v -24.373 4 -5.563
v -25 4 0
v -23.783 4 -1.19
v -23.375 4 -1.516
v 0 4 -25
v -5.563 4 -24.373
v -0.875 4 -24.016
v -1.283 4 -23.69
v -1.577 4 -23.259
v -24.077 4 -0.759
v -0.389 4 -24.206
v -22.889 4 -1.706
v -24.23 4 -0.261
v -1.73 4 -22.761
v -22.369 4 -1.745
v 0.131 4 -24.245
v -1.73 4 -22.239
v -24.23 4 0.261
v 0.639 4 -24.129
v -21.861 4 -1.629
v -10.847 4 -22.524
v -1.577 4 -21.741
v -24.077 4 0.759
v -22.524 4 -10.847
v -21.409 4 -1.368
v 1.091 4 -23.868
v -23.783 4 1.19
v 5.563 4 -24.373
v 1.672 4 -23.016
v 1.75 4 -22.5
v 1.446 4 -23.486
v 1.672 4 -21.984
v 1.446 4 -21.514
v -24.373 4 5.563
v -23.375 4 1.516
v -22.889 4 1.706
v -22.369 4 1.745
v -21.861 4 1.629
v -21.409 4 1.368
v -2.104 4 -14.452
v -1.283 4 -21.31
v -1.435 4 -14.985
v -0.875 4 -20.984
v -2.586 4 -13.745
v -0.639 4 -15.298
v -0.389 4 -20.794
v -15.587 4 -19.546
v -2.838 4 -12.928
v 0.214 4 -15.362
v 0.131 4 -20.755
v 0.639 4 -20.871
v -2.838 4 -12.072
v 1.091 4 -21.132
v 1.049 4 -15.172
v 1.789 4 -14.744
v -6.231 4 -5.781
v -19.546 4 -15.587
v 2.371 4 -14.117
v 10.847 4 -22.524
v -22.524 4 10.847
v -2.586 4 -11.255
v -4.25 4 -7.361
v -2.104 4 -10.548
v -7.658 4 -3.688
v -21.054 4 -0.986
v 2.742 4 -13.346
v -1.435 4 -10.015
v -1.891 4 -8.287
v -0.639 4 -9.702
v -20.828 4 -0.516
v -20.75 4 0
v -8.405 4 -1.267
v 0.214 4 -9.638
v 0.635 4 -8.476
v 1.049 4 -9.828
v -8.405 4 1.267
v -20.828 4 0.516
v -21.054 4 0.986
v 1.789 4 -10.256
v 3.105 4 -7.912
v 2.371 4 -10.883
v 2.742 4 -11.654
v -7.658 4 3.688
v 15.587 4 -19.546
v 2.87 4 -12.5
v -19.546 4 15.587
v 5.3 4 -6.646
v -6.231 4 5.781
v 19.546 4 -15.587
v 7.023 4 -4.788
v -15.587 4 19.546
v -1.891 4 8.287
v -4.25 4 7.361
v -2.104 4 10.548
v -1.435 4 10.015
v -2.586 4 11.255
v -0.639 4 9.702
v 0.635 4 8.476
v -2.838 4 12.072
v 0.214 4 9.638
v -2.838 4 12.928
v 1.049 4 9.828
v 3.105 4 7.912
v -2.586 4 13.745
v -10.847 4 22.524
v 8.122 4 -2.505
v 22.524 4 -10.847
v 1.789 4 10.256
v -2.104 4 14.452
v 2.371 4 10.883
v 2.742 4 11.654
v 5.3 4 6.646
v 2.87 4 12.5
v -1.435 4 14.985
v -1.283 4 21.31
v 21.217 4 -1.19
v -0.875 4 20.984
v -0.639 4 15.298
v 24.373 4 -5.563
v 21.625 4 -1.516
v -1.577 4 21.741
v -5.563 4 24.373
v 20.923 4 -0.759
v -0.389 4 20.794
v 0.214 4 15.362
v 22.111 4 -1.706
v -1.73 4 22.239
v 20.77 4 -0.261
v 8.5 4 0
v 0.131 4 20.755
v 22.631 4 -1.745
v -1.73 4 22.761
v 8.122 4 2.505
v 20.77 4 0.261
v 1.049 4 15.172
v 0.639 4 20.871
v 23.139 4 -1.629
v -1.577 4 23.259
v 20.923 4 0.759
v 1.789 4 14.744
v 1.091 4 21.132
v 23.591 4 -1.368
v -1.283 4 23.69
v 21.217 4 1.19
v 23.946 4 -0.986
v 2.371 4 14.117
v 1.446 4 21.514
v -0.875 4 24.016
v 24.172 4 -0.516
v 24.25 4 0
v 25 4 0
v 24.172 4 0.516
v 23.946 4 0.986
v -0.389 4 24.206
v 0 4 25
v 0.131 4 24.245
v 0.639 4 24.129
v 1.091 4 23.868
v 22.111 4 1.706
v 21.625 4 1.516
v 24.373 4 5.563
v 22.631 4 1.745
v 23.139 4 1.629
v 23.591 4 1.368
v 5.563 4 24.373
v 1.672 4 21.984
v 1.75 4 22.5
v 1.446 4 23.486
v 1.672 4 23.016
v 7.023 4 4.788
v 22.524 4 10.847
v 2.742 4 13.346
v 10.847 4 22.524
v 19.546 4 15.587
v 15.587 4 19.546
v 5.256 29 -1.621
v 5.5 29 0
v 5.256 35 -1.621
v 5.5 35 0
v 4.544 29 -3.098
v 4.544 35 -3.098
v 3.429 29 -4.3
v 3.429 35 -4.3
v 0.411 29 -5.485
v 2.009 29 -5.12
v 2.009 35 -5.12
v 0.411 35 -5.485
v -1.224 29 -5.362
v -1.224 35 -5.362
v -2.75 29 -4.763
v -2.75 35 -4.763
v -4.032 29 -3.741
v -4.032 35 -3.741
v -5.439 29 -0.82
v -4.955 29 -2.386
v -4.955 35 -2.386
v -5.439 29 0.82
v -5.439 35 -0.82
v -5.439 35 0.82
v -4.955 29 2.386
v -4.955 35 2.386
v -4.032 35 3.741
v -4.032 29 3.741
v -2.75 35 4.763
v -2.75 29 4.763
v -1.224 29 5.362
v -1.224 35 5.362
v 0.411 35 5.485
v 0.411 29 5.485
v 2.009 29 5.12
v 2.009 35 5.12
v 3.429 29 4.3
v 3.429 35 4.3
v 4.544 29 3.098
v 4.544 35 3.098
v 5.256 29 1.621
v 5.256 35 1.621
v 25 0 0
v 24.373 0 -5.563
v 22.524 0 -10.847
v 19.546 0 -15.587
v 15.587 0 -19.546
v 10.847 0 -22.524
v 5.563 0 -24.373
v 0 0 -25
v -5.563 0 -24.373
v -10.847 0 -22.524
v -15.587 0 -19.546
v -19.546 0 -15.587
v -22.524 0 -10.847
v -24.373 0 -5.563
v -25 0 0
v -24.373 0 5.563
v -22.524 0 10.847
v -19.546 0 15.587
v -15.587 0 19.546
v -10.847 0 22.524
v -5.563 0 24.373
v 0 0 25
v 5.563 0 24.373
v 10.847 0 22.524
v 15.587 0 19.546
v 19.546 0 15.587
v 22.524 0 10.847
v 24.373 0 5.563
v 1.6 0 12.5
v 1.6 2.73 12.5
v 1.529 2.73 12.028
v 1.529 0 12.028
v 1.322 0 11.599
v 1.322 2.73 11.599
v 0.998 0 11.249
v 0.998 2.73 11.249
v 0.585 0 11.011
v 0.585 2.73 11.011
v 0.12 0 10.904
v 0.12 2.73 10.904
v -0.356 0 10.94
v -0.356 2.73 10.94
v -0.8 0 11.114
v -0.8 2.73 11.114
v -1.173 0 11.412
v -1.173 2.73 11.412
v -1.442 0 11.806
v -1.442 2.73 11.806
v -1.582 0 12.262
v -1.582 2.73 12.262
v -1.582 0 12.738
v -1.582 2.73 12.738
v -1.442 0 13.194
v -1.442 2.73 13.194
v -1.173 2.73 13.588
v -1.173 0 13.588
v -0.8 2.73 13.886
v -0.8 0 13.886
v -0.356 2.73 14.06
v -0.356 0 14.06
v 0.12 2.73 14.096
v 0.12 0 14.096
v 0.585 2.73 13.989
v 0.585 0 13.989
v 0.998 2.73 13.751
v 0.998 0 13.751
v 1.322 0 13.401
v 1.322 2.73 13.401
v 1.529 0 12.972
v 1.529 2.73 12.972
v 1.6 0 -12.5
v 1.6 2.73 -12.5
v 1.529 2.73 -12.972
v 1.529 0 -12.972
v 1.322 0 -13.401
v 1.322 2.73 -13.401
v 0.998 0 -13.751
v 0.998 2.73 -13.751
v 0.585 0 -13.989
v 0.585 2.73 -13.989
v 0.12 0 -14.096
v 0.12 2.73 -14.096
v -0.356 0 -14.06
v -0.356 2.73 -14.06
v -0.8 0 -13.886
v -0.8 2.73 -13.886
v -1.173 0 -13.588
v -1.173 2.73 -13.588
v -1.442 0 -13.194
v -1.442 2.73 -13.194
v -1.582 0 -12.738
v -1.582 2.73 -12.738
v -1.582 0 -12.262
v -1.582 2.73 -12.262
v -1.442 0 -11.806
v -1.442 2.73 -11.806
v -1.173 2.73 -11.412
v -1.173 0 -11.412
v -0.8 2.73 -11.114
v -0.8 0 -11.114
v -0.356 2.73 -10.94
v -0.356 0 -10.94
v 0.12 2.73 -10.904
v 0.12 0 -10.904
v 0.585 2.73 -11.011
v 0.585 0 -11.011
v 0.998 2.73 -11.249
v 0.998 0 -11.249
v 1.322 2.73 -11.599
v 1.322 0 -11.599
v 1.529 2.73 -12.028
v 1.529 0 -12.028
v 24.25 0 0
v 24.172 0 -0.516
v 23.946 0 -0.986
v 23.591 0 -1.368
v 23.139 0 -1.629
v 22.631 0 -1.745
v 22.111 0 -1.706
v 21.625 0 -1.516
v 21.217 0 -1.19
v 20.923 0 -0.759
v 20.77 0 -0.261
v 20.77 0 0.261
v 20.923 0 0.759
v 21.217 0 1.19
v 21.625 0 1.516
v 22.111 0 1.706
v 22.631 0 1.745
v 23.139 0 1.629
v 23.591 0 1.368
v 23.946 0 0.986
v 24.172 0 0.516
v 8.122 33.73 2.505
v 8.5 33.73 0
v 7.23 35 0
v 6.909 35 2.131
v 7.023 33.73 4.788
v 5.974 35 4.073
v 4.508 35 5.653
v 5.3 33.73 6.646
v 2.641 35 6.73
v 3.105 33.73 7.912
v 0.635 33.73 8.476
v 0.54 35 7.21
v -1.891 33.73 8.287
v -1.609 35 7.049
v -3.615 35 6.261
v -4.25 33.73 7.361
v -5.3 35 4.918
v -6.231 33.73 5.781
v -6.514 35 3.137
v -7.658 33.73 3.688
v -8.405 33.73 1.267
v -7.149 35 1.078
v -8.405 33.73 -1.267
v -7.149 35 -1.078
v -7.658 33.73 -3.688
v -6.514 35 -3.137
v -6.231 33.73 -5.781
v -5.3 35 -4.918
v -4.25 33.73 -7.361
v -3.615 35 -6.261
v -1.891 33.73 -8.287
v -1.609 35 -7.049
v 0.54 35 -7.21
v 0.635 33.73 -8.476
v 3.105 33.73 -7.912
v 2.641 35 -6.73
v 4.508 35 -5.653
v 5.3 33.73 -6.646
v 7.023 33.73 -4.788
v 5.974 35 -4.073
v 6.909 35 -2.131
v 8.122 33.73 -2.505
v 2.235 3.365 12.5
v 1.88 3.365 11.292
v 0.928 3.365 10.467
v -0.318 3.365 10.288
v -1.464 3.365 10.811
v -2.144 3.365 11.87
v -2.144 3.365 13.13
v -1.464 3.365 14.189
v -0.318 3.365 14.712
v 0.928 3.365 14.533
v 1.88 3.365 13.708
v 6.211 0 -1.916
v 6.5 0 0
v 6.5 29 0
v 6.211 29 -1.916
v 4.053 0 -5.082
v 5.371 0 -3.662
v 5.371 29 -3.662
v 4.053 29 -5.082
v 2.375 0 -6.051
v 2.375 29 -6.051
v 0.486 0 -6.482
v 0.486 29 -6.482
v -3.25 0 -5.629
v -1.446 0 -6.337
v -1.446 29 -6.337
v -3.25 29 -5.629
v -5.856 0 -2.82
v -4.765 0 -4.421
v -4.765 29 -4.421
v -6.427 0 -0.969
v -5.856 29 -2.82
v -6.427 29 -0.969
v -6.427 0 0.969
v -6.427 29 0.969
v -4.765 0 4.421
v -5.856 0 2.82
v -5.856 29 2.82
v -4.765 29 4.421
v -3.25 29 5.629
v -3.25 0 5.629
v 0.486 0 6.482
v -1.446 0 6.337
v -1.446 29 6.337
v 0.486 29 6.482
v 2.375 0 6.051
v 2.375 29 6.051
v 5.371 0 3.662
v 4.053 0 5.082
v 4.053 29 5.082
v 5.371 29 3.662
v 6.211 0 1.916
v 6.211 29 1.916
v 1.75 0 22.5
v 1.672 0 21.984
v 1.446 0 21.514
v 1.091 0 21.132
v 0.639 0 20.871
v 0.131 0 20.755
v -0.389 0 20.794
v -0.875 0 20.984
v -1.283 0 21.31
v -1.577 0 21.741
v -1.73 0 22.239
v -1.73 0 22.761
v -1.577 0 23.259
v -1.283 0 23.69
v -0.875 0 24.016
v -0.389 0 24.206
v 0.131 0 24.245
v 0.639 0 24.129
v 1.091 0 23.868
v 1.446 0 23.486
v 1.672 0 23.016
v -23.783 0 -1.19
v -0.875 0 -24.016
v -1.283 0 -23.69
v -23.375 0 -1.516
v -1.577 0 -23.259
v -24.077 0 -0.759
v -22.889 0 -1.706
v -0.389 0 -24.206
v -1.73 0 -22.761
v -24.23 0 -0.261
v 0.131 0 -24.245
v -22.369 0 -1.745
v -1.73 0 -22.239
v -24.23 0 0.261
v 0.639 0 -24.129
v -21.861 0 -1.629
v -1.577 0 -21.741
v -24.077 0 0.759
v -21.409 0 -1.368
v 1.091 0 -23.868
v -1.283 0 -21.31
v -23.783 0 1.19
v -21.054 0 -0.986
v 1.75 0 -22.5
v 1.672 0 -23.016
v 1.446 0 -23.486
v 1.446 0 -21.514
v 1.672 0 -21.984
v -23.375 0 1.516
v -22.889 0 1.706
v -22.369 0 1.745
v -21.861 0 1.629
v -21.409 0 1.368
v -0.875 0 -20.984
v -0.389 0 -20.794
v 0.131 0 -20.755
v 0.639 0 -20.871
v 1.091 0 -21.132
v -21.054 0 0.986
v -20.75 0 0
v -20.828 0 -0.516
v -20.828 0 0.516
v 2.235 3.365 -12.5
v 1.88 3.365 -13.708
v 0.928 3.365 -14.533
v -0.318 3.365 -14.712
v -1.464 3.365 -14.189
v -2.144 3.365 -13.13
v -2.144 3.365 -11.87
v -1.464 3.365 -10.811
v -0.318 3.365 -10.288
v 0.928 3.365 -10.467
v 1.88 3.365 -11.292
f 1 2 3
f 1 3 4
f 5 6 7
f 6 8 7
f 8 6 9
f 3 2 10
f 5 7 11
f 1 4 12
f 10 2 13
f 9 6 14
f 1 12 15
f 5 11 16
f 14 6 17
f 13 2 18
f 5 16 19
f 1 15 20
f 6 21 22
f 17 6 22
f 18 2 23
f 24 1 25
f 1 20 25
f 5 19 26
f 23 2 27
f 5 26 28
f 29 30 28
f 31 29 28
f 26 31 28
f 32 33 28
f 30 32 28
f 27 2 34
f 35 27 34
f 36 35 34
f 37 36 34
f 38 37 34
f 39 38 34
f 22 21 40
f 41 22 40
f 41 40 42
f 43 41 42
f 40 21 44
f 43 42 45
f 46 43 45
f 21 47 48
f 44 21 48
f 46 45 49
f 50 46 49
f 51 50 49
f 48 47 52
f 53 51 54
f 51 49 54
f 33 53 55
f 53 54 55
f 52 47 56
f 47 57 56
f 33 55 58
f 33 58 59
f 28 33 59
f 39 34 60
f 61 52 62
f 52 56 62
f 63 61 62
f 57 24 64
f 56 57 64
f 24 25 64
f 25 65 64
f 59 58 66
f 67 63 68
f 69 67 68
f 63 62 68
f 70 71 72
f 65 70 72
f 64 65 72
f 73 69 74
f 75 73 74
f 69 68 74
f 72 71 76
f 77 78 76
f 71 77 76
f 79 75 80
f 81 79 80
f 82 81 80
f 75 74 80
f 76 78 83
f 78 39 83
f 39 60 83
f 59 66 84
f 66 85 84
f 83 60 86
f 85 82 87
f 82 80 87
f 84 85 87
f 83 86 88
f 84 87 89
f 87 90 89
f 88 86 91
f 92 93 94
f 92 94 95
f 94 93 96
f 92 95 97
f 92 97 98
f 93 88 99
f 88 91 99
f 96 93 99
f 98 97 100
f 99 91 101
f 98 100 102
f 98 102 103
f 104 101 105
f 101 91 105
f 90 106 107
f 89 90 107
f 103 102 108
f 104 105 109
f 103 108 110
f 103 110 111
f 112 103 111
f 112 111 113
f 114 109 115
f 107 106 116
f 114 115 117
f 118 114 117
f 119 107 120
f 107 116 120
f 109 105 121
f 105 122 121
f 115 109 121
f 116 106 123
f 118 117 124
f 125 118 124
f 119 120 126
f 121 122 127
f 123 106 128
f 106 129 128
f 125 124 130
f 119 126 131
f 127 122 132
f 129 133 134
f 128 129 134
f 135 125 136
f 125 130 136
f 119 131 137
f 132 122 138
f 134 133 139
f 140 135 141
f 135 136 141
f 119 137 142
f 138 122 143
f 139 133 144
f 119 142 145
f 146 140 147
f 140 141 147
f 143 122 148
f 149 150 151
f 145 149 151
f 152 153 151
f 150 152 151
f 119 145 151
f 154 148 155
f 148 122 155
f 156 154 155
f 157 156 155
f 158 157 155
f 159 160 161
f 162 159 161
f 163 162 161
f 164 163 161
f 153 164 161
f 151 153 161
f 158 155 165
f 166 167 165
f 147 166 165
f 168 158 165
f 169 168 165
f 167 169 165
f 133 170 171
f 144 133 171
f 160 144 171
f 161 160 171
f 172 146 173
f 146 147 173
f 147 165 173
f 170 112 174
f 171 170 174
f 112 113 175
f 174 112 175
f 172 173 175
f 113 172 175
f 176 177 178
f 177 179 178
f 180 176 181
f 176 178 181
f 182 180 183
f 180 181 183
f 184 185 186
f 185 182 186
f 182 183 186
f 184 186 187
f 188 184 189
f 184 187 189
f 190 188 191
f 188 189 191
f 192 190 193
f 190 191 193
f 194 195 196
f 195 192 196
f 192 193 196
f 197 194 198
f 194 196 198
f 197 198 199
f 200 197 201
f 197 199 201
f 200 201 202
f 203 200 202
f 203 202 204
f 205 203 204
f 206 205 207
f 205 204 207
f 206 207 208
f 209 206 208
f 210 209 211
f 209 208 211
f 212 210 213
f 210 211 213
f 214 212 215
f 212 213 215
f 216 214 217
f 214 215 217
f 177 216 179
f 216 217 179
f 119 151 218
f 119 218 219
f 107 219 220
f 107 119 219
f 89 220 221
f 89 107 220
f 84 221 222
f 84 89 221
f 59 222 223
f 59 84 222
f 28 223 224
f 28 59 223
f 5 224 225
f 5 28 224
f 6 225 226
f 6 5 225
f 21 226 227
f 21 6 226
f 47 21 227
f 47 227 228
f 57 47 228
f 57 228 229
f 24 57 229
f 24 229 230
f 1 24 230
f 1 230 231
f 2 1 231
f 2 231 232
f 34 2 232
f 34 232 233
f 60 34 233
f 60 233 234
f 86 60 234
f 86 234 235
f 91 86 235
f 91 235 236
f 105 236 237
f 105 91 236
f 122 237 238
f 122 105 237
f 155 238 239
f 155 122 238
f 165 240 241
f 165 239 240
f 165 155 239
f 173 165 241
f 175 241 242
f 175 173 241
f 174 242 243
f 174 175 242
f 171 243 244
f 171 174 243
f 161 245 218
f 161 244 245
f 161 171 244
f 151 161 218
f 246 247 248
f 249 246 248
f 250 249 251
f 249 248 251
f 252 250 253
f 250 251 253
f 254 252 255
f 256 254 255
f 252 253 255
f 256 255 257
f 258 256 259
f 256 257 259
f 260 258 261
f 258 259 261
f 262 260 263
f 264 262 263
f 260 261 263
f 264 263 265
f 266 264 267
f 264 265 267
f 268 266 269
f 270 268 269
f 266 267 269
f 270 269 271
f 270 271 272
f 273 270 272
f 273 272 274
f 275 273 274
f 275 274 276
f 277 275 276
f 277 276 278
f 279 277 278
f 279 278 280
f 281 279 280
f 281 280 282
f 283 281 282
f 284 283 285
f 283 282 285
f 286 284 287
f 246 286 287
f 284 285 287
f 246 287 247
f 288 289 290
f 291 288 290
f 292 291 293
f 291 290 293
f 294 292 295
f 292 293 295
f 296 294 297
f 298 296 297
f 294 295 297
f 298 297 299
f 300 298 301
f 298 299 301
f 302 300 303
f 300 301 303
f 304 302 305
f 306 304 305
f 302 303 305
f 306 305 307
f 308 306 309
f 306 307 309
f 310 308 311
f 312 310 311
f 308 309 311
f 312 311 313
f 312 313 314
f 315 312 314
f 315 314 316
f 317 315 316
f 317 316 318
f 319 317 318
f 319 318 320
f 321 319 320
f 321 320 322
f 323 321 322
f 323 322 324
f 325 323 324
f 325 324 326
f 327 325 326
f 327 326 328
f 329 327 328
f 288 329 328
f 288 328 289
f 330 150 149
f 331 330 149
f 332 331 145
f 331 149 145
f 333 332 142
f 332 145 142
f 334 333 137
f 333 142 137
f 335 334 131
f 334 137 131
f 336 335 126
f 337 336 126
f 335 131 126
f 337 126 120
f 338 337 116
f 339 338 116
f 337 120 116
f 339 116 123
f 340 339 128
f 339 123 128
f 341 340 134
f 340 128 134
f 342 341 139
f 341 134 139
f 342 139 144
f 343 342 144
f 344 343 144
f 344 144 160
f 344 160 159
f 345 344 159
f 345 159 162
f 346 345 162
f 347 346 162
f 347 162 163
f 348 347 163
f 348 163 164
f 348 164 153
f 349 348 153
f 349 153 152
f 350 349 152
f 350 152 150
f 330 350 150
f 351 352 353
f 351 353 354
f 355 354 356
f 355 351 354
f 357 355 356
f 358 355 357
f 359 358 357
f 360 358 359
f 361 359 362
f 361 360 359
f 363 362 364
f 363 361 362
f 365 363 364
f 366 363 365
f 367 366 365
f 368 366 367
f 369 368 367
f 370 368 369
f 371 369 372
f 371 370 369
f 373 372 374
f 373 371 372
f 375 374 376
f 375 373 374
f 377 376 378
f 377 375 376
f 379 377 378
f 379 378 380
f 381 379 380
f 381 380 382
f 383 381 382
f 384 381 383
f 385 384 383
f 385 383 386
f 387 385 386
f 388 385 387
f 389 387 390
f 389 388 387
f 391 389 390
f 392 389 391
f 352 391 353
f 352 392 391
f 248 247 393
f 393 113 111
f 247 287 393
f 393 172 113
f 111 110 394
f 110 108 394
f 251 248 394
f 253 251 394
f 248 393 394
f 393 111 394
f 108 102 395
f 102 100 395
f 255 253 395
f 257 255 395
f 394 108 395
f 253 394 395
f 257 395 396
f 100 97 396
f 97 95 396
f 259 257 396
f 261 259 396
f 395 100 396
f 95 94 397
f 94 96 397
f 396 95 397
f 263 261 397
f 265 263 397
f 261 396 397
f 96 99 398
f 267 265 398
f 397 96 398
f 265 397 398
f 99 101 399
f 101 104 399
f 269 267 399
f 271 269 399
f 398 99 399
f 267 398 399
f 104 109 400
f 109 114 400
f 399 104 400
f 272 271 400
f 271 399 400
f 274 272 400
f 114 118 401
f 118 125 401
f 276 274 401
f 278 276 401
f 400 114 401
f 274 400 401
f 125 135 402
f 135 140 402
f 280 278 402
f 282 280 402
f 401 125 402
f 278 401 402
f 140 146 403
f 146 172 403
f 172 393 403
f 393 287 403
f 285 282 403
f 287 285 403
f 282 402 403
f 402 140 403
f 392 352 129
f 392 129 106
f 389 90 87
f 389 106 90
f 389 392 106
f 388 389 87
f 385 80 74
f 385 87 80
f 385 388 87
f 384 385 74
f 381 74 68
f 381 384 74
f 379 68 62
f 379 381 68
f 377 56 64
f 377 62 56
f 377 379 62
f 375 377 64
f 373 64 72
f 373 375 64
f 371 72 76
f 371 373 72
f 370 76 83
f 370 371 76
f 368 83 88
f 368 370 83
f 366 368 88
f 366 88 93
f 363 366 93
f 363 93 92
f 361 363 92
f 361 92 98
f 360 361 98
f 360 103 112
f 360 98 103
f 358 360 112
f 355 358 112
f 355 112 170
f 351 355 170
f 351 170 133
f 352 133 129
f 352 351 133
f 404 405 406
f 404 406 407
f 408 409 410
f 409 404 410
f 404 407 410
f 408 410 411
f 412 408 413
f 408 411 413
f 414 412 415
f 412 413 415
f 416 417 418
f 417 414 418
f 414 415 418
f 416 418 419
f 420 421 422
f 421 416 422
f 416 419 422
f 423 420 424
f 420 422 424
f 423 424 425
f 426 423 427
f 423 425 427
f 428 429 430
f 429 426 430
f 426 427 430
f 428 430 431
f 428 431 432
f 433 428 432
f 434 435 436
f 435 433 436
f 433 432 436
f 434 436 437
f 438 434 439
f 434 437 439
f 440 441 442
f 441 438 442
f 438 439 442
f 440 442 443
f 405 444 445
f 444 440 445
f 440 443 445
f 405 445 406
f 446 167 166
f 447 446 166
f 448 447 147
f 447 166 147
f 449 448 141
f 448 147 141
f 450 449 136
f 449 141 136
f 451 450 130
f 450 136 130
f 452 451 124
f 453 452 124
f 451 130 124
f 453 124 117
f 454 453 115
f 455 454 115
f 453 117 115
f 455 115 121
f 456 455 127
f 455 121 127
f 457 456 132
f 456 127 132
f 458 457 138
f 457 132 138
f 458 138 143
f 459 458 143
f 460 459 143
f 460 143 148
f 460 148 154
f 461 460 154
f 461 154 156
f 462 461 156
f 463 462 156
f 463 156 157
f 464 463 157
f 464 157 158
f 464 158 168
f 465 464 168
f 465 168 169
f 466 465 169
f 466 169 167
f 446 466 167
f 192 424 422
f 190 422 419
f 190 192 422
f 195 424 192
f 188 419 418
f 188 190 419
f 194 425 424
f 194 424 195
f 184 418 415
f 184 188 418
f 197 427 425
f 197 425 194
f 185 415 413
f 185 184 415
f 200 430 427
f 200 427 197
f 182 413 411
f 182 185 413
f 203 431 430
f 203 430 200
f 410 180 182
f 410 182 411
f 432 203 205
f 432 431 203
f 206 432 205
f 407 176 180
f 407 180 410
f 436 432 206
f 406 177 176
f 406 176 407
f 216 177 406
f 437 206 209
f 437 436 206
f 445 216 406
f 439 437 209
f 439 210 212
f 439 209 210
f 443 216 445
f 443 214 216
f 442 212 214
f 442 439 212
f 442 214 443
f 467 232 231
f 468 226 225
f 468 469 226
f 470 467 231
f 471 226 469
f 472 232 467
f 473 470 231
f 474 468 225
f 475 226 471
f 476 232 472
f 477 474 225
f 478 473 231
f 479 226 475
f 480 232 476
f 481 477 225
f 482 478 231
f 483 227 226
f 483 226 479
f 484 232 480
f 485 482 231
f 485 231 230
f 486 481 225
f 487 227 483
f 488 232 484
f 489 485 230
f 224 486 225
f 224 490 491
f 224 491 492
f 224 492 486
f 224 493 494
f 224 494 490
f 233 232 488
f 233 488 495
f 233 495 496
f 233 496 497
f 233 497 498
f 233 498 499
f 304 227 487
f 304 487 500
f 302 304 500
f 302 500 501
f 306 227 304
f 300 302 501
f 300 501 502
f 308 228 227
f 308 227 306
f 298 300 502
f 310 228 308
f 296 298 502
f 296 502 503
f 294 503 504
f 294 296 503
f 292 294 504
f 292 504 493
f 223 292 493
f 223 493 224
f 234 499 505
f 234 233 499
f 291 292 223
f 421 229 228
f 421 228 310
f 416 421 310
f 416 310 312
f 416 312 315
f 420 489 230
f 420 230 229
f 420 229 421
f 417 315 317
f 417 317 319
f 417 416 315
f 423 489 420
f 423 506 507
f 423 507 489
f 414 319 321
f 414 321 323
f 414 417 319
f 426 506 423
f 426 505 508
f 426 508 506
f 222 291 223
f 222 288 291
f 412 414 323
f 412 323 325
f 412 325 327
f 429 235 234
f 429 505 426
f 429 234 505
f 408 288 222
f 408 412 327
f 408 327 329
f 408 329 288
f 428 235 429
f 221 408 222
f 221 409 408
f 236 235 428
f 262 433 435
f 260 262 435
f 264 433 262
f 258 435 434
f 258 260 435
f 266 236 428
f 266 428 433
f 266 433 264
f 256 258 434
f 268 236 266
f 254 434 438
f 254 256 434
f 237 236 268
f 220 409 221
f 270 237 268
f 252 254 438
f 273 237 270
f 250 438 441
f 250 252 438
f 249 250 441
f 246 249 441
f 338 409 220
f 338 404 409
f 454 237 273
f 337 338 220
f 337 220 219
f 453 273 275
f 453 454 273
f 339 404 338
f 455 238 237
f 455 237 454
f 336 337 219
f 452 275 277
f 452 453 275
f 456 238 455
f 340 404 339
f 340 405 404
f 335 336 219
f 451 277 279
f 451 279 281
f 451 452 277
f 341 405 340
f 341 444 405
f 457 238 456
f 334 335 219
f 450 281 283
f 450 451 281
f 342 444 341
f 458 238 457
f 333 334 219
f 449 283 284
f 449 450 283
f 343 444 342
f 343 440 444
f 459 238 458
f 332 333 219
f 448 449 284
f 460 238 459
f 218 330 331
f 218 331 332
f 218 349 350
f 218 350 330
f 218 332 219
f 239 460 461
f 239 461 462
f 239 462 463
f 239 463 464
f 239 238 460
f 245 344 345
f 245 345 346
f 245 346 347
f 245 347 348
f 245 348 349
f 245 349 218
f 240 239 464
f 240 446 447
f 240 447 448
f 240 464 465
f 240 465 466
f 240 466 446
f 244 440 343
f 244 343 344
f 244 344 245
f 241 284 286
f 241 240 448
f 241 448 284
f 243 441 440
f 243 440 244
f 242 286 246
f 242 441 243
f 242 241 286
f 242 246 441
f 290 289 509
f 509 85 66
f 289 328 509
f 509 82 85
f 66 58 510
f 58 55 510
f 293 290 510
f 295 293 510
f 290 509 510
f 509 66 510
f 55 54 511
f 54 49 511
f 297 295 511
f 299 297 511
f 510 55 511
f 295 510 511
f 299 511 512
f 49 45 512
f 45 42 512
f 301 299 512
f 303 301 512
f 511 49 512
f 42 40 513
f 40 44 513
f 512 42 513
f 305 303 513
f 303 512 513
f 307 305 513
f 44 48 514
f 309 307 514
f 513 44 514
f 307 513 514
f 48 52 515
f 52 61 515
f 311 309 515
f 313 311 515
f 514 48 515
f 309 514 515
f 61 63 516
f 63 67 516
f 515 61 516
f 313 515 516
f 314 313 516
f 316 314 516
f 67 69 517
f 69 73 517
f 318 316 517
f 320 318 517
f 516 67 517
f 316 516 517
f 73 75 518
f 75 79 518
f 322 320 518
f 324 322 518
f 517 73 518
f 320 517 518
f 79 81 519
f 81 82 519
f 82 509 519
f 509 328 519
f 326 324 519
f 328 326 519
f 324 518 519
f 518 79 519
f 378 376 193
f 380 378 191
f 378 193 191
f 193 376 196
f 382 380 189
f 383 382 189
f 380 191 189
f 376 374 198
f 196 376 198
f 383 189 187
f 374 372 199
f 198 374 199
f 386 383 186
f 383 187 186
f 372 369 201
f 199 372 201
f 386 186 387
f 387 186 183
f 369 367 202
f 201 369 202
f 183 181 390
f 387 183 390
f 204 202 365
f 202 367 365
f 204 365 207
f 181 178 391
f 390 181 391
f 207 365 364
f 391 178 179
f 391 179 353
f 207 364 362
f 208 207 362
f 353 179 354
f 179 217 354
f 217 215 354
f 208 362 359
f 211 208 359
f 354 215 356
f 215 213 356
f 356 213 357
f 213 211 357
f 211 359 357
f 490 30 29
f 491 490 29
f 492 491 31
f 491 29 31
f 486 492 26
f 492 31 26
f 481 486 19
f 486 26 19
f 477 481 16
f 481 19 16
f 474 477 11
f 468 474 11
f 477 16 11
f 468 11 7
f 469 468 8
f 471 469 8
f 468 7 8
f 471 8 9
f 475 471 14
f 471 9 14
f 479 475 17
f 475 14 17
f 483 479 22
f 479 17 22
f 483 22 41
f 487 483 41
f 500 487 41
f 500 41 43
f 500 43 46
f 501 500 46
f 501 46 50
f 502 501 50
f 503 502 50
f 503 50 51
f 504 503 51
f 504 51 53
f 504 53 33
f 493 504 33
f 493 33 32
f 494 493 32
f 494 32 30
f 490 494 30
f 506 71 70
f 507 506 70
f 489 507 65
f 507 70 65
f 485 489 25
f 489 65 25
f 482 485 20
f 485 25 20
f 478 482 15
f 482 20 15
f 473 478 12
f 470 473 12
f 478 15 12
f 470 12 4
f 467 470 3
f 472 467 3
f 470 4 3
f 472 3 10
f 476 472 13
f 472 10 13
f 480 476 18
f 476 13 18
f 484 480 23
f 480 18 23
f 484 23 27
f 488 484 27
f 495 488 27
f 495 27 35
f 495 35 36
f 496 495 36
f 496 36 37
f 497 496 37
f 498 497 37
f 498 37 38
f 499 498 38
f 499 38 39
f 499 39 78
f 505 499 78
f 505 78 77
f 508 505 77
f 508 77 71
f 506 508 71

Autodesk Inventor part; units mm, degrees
ref_plane "YZ Plane" through (0, 0, 0) normal (1, 0, 0) x (0, 1, 0)
ref_plane "XZ Plane" through (0, 0, 0) normal (0, 1, 0) x (-1, 0, 0)
ref_plane "XY Plane" through (0, 0, 0) normal (0, 0, 1) x (1, 0, 0)
sketch "Sketch1" plane through (0, 0, 0) normal (0, 0, 1) x (1, 0, 0)
  line L0 (0, 0) -> (25, 0)
  line L1 (25, 0) -> (25, 4)
  line L2 (25, 4) -> (8.5, 4)
  line L3 (8.5, 4) -> (8.5, 35)
  line L4 (8.5, 35) -> (0, 35)
  line L5 (0, 0) -> (6.5, 0)
  line L6 (6.5, 0) -> (6.5, 29)
  line L7 (6.5, 29) -> (5.5, 29)
  line L8 (5.5, 29) -> (5.5, 35)
  line L9 (0, 35) -> (0, 0)
  dimension "d0" = 25
  dimension "d1" = 4
  dimension "d2" = 8.5
  dimension "d3" = 31
  dimension "d4" = 6.5
  dimension "d5" = 29
  dimension "d6" = 5.5
revolve "Revolution1" add sketch "Sketch1" angle 360 about axis through (0, 35, 0) along (0, -1, 0) contours L6 L7 L8 L4 L3 L2 L1 L0
sketch "Sketch2" plane through (0, 4, 0) normal (0, 1, 0) x (1, 0, 0)
  circle A0 centre (0, -22.5) radius 1.75
  circle A1 centre (22.5, 0) radius 1.75
  circle A2 centre (0, 22.5) radius 1.75
  circle A3 centre (-22.5, 0) radius 1.75
  circle A4 centre (0, -12.5) radius 1.6
  circle A5 centre (0, 12.5) radius 1.6
  point P0 (0, 0)
  dimension "d8" = 3.5
  dimension "d9" = 22.5
  dimension "d12" = 360
  dimension "d14" = 3.2
  dimension "d15" = 12.5
  dimension "d18" = 360
extrude "Extrusion1" cut sketch "Sketch2" against normal blind 25.4
chamfer "Chamfer1" distance 1.27 angle 45 2 edges at (-1.6, 4, 12.5) (-1.6, 4, -12.5)
chamfer "Chamfer2" distance 1.27 angle 45 1 edges at (-8.5, 35, 0)
properties part number "MotorMount"
